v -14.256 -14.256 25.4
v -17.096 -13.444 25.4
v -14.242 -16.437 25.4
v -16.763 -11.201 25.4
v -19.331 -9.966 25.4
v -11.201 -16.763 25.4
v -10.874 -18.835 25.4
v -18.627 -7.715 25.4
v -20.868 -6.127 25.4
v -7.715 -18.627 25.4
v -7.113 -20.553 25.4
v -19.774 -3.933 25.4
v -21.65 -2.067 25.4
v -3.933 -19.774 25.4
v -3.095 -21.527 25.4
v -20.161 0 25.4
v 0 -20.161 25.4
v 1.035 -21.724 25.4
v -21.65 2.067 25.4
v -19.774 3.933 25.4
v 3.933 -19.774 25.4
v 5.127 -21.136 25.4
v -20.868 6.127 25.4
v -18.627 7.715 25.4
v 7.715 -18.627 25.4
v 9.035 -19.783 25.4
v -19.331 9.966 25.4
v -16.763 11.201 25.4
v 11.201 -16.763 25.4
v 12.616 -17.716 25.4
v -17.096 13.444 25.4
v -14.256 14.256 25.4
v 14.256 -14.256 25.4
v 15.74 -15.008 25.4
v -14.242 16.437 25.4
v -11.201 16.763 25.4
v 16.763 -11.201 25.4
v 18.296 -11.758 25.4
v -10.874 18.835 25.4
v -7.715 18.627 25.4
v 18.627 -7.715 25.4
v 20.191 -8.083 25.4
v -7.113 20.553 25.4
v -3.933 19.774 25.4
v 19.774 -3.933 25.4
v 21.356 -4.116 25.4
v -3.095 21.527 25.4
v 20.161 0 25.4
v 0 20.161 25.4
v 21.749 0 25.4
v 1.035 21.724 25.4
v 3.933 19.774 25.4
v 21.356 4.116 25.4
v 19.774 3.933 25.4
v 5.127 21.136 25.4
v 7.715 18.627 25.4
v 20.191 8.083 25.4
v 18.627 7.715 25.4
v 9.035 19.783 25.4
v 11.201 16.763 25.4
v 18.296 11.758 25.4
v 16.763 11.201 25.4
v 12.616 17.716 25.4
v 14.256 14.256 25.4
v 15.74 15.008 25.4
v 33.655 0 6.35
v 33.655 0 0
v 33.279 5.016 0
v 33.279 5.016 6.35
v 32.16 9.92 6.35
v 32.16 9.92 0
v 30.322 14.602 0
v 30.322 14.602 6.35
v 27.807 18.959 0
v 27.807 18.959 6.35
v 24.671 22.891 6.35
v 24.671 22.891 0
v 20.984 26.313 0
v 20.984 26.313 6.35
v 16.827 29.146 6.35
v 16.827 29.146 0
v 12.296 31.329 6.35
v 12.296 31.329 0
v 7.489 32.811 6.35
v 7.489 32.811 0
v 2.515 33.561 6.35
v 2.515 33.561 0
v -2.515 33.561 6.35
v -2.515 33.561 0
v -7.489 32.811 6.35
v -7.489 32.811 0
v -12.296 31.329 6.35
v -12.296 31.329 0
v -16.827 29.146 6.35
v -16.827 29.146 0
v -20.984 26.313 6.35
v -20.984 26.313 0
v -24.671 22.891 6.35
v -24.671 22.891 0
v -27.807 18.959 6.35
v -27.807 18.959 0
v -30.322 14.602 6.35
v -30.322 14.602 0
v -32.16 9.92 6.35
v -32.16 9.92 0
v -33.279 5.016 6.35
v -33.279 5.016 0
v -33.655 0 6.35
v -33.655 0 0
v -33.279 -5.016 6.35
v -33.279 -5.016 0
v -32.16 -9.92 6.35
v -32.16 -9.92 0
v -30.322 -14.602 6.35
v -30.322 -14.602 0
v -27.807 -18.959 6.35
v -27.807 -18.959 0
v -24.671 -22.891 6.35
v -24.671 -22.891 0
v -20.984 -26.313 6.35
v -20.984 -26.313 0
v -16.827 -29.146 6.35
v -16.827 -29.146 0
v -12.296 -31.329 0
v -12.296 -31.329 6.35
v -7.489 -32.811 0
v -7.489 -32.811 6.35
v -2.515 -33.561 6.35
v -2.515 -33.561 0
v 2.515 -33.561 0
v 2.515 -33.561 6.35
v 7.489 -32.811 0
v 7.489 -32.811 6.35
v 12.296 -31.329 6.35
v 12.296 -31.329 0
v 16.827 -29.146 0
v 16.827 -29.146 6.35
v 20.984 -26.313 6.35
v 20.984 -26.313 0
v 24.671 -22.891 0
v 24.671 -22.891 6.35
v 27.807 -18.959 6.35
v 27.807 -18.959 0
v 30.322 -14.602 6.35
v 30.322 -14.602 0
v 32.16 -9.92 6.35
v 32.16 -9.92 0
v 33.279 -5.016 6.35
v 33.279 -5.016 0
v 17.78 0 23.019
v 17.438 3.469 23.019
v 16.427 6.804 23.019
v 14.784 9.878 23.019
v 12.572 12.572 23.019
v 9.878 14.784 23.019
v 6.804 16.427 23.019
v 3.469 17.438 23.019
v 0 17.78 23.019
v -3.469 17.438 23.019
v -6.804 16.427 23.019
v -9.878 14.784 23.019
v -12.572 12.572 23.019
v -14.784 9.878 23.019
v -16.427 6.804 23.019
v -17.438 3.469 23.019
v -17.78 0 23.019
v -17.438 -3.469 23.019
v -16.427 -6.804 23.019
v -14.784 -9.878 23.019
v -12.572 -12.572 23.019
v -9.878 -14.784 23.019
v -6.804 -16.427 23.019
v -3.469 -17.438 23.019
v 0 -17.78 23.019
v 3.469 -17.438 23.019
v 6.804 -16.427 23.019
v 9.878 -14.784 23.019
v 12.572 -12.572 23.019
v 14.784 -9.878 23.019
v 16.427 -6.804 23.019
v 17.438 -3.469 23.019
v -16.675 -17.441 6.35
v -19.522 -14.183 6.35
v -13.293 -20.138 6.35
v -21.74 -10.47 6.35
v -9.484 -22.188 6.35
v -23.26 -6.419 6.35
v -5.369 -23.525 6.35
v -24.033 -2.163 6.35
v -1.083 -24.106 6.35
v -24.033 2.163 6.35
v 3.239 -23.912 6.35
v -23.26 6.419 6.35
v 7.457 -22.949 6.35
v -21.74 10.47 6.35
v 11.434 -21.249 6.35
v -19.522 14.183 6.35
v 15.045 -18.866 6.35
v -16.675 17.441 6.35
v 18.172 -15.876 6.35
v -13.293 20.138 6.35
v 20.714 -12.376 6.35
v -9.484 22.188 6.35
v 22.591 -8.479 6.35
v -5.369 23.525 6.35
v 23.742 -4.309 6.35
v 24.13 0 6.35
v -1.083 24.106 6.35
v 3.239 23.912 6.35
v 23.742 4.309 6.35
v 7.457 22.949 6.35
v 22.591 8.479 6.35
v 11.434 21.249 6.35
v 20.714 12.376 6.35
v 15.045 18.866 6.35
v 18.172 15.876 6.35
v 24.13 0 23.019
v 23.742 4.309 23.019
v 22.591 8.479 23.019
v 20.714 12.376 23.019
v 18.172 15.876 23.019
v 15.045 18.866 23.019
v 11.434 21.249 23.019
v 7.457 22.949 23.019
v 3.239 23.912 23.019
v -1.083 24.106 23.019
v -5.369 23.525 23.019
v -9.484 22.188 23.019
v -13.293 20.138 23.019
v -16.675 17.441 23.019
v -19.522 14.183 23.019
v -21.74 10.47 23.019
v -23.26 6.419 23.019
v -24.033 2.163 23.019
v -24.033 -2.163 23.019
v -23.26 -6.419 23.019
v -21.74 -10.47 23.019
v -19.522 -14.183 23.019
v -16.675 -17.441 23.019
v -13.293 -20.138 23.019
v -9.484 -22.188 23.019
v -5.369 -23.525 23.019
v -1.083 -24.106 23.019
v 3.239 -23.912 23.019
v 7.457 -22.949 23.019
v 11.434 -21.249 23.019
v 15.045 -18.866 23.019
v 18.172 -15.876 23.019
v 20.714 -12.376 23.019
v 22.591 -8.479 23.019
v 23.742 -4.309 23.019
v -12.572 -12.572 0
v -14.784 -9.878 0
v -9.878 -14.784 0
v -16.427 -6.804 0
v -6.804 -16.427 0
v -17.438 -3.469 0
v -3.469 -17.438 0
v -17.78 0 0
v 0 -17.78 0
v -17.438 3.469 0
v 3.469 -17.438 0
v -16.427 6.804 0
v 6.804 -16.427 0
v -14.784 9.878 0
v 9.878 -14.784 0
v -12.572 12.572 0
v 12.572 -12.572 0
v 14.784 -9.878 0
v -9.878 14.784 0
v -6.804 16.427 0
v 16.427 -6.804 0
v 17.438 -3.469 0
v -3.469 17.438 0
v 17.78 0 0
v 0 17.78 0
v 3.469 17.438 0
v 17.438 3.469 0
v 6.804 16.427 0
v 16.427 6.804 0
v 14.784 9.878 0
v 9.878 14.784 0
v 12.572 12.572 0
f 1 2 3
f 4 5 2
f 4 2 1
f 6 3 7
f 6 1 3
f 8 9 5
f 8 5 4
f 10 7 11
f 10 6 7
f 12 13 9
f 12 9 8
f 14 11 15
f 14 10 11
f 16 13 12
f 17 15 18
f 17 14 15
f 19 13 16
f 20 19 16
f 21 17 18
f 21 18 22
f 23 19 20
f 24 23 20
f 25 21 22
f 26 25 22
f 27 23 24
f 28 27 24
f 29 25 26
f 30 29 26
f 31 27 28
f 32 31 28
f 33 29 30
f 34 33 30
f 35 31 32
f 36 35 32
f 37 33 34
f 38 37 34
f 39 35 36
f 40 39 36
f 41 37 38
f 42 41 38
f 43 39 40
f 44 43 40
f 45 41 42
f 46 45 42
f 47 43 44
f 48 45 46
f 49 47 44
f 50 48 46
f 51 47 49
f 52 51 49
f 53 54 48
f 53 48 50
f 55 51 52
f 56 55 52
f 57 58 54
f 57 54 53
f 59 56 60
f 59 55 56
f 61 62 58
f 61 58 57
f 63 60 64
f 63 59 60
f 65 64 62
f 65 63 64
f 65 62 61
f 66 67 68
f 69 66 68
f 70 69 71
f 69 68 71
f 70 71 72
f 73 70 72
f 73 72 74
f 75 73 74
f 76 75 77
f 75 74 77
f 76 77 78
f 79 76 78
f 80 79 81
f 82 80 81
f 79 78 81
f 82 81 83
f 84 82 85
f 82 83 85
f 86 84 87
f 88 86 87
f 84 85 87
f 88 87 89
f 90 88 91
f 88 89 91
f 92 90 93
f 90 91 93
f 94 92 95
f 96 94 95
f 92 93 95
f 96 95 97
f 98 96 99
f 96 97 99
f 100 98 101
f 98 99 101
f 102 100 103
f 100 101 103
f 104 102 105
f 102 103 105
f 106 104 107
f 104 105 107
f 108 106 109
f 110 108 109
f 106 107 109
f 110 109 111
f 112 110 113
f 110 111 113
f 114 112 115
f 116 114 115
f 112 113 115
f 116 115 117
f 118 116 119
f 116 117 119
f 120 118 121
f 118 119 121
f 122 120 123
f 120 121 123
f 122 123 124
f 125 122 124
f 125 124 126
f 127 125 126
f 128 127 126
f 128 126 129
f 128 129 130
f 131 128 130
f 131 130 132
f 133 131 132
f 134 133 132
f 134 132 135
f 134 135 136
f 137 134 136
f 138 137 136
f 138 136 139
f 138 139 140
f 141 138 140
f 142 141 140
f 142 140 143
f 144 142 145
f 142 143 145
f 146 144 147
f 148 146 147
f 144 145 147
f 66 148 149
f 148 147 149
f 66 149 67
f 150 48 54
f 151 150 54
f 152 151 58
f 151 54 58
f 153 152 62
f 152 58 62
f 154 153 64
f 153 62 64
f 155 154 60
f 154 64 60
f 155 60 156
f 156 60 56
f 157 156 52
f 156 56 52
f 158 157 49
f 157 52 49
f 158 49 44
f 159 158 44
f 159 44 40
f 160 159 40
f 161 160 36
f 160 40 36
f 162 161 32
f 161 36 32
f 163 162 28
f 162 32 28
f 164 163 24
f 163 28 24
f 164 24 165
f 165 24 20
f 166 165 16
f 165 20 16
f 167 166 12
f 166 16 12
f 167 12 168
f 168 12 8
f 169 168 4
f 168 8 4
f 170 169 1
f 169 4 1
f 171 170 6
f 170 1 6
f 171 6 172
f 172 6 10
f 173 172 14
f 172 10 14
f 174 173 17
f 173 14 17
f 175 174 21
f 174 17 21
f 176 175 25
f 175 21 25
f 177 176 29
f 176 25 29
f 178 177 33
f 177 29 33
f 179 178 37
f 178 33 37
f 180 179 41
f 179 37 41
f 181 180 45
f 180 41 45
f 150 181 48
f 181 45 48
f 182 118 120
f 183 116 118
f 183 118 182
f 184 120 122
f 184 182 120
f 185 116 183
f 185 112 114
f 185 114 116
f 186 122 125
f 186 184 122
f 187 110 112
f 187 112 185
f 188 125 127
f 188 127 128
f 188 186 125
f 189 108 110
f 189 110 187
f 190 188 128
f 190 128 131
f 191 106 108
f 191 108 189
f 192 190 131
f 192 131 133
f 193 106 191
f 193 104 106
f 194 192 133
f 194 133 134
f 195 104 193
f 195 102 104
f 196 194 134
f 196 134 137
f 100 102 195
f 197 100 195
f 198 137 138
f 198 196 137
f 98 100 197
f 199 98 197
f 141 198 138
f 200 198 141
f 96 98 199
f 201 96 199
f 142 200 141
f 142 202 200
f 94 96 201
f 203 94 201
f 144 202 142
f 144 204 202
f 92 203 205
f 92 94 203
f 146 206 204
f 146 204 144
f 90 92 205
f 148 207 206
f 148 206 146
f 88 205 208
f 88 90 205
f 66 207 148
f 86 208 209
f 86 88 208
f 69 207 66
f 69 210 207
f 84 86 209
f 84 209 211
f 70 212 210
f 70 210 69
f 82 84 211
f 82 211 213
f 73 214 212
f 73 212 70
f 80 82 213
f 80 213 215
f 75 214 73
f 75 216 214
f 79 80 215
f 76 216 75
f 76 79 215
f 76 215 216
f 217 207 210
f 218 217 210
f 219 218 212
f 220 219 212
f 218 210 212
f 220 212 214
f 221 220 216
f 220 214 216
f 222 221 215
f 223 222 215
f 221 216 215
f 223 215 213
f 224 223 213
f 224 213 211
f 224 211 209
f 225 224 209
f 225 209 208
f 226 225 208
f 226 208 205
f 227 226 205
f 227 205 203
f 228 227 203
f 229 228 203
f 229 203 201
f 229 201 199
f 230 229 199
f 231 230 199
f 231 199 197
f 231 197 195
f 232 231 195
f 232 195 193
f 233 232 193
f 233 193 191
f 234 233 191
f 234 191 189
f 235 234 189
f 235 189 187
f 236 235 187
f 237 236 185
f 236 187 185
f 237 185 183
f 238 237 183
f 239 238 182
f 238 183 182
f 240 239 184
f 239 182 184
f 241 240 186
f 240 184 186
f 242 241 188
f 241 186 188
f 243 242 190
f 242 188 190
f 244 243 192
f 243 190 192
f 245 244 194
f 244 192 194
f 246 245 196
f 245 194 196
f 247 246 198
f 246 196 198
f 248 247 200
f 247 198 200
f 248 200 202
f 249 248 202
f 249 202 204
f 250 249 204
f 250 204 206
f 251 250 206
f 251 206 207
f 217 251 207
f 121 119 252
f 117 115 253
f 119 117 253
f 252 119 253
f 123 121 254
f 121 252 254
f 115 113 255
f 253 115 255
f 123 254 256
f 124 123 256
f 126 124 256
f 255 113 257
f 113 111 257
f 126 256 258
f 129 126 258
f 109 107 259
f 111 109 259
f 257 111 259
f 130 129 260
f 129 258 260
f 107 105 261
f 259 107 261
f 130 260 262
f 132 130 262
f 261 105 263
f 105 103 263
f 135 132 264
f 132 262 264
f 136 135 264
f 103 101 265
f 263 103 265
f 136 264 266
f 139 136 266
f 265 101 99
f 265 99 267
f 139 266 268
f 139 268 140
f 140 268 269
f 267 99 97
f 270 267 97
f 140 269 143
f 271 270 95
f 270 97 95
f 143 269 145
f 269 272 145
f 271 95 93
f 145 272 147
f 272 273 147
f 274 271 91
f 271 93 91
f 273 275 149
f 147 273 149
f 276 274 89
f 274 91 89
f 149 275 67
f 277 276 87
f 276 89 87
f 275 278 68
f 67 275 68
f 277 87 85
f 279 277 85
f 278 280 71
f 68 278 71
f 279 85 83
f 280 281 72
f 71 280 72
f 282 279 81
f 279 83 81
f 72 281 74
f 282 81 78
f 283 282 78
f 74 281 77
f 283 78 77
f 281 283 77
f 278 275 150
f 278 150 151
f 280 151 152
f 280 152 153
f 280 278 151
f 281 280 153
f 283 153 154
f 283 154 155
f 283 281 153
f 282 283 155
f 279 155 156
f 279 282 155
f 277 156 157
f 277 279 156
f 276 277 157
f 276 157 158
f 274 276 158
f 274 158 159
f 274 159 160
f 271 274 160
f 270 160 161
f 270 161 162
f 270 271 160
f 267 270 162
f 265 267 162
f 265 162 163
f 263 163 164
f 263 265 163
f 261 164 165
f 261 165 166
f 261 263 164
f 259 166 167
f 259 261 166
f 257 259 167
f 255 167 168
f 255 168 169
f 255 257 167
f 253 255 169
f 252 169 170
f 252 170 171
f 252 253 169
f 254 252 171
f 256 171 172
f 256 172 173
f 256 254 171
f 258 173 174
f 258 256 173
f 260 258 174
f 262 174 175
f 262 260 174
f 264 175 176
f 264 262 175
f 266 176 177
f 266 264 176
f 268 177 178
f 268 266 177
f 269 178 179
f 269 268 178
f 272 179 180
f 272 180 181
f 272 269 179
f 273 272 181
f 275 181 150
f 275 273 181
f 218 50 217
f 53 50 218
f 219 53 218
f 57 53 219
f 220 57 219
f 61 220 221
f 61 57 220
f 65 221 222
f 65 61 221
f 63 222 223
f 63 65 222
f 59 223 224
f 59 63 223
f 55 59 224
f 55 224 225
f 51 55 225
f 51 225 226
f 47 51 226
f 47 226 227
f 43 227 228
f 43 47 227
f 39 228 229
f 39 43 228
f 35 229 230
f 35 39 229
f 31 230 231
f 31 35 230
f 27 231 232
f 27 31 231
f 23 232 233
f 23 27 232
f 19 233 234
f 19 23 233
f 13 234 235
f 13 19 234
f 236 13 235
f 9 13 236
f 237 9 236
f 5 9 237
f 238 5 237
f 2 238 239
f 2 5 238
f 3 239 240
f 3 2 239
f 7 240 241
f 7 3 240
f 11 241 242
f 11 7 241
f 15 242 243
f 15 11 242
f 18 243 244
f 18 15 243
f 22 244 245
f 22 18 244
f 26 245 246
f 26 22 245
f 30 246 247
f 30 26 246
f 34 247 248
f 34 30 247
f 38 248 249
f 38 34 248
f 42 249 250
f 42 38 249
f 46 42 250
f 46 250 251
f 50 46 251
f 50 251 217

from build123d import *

# Parameters (mm, degrees)
F0_R     = 24.13
F0_R_2   = 17.78
F1_DEPTH = 25.4
F2_R     = 33.655
F2_R_2   = 24.13
F3_DEPTH = 6.35
F4_SIZE  = 2.38125


with BuildPart() as f1:
    # F0 (on Top) → F1 (new body)
    with BuildSketch(Plane.XY):
        Circle(F0_R)
        Circle(F0_R_2, mode=Mode.SUBTRACT)
    extrude(amount=F1_DEPTH)

    # F2 (on Top) → F3 (join)
    with BuildSketch(Plane.XY):
        Circle(F2_R)
        Circle(F2_R_2, mode=Mode.SUBTRACT)
    extrude(amount=F3_DEPTH)

    # F4
    f4_edges = [f1.edges().sort_by_distance(p)[0] for p in [
        (-24.13, 0, 25.4),
        (-17.78, 0, 25.4),
    ]]
    chamfer(f4_edges, length=F4_SIZE)


solid = f1.part
